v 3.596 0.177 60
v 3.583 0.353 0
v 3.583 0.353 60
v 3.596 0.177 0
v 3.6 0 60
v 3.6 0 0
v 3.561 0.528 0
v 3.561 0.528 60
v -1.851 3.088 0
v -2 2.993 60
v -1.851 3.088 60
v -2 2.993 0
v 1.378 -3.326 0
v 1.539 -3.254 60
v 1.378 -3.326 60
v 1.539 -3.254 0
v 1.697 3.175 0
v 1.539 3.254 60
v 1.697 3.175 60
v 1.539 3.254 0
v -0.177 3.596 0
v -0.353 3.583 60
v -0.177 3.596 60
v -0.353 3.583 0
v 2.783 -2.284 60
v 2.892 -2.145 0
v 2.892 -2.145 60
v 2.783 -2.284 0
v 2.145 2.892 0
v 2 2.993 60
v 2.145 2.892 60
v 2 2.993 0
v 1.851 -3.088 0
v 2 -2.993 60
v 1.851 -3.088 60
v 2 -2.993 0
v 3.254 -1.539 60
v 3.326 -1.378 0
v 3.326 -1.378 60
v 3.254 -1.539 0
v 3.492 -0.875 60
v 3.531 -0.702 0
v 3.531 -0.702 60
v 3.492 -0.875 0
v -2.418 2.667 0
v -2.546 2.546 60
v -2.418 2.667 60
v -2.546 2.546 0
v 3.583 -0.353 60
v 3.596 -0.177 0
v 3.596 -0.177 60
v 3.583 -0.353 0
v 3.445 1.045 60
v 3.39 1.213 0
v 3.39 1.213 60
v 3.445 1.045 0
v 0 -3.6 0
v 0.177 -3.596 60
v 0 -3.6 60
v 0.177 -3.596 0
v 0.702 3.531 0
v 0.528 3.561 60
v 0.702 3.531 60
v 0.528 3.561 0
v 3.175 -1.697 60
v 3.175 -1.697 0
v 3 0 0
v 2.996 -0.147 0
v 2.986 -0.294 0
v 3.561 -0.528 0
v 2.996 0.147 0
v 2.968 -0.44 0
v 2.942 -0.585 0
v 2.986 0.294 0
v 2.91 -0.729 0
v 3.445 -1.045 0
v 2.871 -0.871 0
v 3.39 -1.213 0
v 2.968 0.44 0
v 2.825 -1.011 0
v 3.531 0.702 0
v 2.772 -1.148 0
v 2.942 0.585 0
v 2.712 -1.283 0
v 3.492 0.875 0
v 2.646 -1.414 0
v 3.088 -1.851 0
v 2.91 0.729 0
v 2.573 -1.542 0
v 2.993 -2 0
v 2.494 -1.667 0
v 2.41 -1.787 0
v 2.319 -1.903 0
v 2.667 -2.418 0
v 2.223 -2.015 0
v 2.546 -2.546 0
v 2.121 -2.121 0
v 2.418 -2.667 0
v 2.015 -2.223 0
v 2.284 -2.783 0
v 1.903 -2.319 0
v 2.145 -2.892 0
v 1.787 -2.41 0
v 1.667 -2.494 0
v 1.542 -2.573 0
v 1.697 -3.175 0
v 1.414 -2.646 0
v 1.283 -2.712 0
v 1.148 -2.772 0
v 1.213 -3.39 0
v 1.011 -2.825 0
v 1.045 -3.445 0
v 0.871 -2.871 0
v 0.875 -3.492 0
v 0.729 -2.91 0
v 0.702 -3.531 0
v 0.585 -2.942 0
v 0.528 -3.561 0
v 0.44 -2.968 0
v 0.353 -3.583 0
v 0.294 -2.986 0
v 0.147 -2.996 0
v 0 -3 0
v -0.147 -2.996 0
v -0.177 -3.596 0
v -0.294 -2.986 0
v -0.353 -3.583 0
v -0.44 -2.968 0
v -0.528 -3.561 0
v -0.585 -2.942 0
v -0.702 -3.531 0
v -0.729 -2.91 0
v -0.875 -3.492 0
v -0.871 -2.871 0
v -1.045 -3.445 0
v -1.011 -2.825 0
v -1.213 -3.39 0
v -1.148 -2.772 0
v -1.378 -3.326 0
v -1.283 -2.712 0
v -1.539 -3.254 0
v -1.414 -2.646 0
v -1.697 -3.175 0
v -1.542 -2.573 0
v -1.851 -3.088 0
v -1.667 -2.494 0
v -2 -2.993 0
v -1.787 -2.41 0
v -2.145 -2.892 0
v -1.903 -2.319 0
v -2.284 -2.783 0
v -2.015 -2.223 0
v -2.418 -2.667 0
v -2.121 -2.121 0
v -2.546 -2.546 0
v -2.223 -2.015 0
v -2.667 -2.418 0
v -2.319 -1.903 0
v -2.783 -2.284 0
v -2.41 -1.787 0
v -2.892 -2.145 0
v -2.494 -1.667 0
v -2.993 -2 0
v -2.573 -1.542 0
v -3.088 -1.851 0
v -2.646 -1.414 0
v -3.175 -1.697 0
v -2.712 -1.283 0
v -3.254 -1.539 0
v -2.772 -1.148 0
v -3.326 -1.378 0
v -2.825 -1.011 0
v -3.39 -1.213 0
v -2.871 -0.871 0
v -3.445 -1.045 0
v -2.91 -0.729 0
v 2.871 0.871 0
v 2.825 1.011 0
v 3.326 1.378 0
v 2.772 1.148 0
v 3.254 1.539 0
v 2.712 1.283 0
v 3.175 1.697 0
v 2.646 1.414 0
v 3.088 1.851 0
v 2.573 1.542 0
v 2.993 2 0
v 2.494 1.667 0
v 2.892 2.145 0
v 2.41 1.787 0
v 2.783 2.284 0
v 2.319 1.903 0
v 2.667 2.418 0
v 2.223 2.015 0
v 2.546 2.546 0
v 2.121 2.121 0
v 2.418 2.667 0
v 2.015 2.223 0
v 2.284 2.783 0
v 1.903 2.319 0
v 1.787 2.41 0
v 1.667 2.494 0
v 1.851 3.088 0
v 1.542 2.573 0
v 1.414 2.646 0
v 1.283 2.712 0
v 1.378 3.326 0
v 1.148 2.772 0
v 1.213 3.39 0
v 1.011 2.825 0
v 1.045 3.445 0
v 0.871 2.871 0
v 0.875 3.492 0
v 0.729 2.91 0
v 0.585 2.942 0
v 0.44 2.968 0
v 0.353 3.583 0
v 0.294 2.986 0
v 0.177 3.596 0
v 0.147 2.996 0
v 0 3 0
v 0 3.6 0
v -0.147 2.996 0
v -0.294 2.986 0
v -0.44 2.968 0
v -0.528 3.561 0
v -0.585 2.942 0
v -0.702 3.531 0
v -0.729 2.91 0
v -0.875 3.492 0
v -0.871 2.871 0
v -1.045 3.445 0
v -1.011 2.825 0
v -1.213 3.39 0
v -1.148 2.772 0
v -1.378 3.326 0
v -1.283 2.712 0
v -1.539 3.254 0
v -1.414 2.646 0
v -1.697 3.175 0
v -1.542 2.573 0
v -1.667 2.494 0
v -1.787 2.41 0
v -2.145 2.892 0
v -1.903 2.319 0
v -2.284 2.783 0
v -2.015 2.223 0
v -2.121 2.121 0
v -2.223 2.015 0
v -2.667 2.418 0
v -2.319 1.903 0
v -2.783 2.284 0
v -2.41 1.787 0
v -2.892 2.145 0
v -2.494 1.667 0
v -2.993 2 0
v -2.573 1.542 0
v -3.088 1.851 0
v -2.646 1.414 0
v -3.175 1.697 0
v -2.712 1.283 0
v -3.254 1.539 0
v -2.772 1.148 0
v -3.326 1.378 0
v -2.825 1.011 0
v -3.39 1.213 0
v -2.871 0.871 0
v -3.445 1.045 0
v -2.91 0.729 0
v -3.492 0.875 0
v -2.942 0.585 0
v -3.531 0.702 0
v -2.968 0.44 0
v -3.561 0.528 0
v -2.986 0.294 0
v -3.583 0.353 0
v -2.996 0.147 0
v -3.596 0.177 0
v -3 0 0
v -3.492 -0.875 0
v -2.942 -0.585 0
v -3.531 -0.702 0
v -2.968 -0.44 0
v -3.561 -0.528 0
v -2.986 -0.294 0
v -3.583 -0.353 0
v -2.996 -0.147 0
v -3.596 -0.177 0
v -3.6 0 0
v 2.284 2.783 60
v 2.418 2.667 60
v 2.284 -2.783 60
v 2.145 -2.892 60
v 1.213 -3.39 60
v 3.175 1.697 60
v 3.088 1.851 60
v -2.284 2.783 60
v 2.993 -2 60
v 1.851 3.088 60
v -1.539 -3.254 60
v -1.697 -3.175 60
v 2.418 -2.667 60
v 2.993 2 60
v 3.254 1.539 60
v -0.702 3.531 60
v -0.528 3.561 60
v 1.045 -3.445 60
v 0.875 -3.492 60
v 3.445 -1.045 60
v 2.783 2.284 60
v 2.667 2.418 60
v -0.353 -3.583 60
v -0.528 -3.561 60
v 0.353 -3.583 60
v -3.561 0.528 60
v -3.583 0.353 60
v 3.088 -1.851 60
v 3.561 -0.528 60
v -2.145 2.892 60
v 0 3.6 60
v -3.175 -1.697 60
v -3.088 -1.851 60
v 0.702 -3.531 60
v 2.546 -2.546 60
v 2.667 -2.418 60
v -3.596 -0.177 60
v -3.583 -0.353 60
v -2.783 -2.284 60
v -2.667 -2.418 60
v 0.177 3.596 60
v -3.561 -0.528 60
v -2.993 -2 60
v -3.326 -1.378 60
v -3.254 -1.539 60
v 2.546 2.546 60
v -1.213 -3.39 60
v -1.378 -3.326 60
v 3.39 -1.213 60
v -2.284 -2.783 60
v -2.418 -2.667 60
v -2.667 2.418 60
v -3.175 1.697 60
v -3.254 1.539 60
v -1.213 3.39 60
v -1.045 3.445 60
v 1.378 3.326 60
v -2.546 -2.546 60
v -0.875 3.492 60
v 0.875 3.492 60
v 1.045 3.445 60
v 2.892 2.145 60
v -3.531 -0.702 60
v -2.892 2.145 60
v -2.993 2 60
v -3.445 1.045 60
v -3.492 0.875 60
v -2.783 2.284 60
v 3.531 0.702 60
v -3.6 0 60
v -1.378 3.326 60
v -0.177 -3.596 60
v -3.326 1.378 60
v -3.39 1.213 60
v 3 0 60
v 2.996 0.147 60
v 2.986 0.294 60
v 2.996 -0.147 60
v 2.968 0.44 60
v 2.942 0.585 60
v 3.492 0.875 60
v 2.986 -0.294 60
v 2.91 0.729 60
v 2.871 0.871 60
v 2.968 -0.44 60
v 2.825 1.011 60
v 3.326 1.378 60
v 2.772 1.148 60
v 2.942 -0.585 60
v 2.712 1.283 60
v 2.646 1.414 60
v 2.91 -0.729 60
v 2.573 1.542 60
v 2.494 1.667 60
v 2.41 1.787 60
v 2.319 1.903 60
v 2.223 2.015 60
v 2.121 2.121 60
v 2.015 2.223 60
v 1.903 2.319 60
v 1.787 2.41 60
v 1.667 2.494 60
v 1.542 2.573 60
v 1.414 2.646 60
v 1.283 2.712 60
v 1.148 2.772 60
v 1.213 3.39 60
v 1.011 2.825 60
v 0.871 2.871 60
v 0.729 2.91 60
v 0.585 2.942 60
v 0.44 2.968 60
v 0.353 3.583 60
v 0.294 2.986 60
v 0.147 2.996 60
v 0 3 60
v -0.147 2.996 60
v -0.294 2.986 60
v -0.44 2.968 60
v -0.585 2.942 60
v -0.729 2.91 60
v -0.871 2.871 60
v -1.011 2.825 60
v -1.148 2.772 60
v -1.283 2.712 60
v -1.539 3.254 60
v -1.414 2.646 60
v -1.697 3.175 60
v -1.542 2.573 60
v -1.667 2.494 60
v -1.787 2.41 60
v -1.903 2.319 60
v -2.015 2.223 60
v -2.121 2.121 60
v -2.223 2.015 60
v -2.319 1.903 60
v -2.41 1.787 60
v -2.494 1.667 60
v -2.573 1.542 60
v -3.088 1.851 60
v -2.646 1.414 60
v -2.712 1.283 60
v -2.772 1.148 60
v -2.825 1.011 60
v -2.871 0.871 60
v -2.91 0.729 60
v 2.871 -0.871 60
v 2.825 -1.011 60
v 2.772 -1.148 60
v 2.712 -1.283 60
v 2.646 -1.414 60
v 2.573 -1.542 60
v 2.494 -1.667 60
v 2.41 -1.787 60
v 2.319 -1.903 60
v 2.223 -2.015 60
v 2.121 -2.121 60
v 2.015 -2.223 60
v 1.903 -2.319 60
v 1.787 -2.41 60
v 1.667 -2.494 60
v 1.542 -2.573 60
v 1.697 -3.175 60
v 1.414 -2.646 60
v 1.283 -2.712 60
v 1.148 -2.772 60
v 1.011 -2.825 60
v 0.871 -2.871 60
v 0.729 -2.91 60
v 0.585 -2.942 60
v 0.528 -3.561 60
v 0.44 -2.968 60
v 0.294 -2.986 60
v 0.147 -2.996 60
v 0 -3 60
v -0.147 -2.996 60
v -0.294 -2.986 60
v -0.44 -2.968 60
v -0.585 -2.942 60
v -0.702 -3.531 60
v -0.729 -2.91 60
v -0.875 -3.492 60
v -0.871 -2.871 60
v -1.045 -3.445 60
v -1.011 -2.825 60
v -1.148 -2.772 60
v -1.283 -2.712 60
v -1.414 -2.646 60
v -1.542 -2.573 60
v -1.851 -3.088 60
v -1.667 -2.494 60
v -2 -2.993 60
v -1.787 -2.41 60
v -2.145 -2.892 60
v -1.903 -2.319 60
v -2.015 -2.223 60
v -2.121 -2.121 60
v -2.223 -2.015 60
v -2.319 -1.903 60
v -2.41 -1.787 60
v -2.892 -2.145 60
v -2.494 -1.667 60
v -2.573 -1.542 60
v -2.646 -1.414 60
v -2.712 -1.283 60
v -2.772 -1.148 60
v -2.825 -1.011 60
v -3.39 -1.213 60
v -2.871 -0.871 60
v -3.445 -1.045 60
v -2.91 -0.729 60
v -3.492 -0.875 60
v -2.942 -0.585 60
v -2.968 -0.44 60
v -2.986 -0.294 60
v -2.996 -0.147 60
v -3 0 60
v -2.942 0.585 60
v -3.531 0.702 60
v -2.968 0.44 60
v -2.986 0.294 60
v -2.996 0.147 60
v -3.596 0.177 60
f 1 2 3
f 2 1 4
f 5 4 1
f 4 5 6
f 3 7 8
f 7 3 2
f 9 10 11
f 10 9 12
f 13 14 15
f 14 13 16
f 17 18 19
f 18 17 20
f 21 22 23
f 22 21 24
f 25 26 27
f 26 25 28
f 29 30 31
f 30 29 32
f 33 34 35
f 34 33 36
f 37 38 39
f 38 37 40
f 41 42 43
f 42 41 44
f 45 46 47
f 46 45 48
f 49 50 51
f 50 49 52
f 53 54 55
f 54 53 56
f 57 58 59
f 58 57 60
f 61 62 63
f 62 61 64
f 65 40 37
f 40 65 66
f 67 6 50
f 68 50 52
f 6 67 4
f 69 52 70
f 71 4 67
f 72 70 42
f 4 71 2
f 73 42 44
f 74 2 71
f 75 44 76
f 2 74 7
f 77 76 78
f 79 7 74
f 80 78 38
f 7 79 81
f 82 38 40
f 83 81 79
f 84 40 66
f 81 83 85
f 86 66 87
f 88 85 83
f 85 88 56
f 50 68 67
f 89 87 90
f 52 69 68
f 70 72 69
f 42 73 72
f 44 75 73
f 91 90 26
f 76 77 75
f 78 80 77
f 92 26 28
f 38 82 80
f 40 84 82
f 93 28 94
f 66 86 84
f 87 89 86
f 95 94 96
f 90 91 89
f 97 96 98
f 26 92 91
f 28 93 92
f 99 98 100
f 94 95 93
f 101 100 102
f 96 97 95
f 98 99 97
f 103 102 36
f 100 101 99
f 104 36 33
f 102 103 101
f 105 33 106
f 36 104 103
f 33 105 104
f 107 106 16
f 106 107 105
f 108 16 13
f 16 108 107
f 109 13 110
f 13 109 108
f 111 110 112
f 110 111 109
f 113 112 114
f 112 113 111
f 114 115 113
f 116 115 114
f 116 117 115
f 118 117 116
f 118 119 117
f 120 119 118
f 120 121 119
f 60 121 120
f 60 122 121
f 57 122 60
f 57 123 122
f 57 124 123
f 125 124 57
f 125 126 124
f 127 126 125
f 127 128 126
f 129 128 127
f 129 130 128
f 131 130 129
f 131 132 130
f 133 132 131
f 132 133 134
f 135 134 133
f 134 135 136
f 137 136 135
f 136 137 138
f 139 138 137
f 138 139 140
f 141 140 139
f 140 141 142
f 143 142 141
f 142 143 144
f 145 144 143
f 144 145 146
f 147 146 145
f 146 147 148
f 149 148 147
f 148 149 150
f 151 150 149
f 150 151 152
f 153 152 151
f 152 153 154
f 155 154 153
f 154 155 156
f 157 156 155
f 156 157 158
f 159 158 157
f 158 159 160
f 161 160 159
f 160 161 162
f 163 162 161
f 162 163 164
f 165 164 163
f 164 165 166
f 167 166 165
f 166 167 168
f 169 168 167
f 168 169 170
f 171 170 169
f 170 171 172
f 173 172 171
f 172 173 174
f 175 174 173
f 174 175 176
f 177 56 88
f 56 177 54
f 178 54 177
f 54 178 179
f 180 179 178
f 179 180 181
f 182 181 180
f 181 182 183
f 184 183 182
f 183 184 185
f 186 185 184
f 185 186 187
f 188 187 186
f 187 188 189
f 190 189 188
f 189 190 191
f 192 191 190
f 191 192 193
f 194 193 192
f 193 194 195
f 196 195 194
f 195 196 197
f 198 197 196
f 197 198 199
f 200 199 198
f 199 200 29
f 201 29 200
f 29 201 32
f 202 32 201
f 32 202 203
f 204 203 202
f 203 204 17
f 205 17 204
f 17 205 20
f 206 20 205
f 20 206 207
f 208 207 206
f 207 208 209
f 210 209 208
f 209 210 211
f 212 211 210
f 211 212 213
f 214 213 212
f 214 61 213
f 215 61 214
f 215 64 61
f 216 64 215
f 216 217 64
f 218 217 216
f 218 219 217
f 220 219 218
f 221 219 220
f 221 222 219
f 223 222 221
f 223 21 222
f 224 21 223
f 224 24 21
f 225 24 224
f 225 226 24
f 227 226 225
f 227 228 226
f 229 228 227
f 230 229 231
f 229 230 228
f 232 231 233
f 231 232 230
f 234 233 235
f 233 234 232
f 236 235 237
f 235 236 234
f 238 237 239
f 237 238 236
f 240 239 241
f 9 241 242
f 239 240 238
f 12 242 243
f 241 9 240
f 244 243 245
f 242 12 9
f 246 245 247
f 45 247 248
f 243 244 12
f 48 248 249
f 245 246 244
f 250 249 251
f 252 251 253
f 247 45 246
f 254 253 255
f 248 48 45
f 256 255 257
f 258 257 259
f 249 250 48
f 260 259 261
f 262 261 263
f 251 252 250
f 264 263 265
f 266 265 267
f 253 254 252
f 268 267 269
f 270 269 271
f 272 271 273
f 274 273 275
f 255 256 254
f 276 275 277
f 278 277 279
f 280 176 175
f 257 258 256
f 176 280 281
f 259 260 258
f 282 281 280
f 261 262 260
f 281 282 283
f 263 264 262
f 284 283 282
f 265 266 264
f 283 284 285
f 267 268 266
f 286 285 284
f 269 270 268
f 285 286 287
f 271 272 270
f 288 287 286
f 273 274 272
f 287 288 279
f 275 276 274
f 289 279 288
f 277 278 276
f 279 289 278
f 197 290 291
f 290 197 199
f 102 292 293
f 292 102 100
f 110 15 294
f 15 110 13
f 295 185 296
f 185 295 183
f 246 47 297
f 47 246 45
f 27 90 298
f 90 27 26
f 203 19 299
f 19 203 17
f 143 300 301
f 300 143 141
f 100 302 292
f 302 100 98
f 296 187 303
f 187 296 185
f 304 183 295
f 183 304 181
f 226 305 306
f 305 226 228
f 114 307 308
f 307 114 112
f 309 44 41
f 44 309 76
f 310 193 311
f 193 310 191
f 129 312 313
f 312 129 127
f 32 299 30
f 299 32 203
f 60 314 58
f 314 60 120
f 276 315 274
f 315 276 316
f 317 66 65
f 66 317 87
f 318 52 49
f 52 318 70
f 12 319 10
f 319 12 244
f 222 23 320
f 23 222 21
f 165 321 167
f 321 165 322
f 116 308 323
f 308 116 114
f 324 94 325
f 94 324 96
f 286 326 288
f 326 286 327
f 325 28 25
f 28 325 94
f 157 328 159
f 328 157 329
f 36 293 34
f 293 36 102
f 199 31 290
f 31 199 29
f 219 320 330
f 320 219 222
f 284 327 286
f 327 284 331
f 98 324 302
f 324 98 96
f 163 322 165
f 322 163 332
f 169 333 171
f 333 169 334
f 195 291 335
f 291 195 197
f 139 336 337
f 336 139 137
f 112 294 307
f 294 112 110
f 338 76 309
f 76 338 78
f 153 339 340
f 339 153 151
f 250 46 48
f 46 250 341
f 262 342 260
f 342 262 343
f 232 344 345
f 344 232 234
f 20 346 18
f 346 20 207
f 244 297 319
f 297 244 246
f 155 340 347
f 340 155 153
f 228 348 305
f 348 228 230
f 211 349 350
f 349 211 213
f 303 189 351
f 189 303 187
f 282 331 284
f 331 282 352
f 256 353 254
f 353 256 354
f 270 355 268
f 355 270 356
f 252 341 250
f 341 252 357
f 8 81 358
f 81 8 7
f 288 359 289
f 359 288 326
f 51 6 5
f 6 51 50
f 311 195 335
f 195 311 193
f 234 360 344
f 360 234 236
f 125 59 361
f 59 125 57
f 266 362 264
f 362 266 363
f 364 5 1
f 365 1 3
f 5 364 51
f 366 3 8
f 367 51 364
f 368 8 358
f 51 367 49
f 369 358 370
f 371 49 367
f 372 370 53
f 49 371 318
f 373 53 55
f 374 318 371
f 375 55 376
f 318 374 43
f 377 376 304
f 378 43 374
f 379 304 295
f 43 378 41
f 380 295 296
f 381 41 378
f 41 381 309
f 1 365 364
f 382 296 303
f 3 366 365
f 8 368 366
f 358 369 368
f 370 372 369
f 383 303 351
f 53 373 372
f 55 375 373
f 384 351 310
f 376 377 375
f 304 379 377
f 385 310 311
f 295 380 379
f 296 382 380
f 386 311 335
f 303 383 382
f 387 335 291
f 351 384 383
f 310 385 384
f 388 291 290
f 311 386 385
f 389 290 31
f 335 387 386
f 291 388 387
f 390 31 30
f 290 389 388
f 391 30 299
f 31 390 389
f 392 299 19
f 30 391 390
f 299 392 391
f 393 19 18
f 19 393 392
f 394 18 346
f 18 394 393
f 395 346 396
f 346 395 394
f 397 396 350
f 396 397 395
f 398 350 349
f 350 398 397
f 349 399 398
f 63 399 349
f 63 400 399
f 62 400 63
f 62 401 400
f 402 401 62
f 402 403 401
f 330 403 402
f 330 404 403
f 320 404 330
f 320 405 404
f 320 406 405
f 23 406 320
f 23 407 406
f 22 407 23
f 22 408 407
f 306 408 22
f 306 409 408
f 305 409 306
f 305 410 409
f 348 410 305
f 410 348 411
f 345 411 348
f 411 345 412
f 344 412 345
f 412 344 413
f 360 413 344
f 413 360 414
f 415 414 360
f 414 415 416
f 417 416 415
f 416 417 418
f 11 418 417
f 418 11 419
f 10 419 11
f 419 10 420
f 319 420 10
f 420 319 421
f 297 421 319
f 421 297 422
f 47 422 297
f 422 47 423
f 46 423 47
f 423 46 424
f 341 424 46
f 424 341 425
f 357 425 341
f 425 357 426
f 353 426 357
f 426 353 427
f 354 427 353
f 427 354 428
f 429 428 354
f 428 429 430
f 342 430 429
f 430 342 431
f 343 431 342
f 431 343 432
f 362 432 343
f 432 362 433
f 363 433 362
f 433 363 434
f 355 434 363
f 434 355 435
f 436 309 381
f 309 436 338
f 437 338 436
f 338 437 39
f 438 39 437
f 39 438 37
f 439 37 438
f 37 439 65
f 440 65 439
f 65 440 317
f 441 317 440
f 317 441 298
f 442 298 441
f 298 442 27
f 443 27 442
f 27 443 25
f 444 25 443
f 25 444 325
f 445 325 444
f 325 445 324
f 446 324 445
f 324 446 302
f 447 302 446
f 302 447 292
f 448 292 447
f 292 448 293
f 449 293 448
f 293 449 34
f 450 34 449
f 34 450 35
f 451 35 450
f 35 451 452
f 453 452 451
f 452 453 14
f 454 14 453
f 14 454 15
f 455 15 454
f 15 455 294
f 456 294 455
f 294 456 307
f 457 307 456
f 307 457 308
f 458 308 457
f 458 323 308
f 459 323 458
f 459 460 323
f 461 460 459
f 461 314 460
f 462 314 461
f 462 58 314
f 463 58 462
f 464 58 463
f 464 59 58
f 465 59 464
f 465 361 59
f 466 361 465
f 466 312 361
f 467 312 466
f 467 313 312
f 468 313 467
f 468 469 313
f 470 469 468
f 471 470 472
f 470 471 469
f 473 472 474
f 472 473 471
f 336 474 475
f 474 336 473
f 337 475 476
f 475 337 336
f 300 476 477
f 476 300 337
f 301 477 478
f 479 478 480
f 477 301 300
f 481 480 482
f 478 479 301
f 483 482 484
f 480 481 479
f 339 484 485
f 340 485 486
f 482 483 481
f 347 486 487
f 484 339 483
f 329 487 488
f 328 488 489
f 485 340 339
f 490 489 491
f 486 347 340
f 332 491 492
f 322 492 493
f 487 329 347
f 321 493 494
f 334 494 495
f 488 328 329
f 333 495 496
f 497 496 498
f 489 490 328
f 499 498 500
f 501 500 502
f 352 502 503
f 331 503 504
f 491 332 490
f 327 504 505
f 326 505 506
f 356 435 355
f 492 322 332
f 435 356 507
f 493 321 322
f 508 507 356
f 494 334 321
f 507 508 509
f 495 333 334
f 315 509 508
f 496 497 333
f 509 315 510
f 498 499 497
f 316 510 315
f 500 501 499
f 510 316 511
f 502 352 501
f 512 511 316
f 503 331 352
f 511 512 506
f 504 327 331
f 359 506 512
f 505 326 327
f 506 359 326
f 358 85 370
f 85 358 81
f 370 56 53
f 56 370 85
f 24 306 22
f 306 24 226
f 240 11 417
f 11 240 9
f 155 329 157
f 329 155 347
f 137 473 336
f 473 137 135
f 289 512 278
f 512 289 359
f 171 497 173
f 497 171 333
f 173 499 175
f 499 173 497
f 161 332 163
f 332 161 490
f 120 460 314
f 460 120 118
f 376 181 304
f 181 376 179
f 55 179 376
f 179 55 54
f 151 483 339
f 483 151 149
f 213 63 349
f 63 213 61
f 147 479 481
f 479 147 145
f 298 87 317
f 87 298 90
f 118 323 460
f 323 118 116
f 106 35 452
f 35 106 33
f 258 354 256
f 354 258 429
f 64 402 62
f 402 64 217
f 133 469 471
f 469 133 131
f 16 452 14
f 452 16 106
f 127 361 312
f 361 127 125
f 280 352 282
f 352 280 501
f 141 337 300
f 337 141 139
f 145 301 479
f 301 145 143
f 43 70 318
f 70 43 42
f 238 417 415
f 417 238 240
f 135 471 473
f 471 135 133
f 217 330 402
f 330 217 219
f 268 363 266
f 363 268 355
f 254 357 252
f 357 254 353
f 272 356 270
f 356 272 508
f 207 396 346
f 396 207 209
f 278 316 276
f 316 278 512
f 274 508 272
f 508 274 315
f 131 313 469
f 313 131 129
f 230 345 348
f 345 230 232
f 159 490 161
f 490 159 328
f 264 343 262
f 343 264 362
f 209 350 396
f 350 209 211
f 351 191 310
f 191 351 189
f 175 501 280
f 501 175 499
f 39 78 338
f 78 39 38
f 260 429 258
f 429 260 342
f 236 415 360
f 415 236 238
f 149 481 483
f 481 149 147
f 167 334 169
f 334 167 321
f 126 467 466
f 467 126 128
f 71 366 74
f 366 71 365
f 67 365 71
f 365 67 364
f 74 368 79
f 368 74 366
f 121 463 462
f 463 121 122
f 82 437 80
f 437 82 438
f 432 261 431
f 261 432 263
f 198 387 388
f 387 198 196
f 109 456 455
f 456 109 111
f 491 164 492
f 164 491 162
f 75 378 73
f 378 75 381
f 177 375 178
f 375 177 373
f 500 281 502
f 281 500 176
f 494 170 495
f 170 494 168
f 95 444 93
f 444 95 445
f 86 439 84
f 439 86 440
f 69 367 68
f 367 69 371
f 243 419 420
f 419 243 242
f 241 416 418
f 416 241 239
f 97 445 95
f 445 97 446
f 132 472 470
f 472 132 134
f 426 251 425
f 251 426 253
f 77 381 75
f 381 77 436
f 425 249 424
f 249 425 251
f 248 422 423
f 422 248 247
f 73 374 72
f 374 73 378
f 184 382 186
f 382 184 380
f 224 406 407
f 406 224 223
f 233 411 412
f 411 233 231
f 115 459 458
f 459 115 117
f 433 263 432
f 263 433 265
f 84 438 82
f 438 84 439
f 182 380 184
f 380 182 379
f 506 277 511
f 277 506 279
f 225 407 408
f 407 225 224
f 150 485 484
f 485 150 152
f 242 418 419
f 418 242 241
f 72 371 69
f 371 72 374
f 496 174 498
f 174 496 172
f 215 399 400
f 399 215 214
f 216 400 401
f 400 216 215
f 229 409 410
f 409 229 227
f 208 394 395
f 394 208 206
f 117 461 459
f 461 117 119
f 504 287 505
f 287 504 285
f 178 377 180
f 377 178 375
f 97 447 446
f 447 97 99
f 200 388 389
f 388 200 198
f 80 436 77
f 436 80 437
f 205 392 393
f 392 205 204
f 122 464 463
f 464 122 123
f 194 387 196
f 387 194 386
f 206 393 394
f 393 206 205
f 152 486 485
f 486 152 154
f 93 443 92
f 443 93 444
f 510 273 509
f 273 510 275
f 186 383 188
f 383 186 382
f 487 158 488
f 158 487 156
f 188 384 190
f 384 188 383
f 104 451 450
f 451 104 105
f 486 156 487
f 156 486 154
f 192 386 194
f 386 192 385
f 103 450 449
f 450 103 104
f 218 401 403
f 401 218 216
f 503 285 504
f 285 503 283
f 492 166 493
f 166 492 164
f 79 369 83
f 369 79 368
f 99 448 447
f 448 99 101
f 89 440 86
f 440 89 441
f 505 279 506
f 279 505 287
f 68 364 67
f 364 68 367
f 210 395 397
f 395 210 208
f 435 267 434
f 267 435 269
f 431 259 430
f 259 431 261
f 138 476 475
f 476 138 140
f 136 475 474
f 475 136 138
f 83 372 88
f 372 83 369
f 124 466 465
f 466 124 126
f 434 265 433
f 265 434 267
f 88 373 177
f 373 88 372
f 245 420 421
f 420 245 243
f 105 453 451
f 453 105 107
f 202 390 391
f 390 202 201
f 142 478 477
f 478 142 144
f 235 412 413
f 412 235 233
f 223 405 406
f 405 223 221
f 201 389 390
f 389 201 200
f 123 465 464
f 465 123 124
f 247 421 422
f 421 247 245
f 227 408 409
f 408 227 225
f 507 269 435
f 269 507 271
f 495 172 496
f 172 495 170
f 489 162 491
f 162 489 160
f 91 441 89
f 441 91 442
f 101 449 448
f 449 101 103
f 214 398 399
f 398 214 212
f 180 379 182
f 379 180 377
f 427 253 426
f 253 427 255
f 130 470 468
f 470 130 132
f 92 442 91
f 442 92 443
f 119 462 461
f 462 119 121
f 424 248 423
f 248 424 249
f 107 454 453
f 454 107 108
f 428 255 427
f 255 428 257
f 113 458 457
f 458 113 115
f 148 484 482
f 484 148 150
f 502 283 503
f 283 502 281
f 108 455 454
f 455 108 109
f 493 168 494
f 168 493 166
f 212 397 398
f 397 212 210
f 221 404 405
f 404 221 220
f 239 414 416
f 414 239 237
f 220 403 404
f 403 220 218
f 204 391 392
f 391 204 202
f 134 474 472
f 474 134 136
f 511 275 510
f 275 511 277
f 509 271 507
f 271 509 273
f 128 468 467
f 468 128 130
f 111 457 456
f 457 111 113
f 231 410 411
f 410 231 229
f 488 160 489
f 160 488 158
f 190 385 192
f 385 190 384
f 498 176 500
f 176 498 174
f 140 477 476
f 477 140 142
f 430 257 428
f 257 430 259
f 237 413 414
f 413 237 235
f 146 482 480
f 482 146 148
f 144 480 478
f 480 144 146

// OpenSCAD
$fn = 128;

// Heatshrink sleeving (tubing)
inner_d = 6;        // mm
wall = 0.6;         // mm
length = 60;        // mm

outer_d = inner_d + 2*wall;

module heatshrink_sleeve(id, od, h) {
    difference() {
        cylinder(d=od, h=h, center=false);
        translate([0,0,-0.2])
            cylinder(d=id, h=h+0.4, center=false);
    }
}

heatshrink_sleeve(inner_d, outer_d, length);
